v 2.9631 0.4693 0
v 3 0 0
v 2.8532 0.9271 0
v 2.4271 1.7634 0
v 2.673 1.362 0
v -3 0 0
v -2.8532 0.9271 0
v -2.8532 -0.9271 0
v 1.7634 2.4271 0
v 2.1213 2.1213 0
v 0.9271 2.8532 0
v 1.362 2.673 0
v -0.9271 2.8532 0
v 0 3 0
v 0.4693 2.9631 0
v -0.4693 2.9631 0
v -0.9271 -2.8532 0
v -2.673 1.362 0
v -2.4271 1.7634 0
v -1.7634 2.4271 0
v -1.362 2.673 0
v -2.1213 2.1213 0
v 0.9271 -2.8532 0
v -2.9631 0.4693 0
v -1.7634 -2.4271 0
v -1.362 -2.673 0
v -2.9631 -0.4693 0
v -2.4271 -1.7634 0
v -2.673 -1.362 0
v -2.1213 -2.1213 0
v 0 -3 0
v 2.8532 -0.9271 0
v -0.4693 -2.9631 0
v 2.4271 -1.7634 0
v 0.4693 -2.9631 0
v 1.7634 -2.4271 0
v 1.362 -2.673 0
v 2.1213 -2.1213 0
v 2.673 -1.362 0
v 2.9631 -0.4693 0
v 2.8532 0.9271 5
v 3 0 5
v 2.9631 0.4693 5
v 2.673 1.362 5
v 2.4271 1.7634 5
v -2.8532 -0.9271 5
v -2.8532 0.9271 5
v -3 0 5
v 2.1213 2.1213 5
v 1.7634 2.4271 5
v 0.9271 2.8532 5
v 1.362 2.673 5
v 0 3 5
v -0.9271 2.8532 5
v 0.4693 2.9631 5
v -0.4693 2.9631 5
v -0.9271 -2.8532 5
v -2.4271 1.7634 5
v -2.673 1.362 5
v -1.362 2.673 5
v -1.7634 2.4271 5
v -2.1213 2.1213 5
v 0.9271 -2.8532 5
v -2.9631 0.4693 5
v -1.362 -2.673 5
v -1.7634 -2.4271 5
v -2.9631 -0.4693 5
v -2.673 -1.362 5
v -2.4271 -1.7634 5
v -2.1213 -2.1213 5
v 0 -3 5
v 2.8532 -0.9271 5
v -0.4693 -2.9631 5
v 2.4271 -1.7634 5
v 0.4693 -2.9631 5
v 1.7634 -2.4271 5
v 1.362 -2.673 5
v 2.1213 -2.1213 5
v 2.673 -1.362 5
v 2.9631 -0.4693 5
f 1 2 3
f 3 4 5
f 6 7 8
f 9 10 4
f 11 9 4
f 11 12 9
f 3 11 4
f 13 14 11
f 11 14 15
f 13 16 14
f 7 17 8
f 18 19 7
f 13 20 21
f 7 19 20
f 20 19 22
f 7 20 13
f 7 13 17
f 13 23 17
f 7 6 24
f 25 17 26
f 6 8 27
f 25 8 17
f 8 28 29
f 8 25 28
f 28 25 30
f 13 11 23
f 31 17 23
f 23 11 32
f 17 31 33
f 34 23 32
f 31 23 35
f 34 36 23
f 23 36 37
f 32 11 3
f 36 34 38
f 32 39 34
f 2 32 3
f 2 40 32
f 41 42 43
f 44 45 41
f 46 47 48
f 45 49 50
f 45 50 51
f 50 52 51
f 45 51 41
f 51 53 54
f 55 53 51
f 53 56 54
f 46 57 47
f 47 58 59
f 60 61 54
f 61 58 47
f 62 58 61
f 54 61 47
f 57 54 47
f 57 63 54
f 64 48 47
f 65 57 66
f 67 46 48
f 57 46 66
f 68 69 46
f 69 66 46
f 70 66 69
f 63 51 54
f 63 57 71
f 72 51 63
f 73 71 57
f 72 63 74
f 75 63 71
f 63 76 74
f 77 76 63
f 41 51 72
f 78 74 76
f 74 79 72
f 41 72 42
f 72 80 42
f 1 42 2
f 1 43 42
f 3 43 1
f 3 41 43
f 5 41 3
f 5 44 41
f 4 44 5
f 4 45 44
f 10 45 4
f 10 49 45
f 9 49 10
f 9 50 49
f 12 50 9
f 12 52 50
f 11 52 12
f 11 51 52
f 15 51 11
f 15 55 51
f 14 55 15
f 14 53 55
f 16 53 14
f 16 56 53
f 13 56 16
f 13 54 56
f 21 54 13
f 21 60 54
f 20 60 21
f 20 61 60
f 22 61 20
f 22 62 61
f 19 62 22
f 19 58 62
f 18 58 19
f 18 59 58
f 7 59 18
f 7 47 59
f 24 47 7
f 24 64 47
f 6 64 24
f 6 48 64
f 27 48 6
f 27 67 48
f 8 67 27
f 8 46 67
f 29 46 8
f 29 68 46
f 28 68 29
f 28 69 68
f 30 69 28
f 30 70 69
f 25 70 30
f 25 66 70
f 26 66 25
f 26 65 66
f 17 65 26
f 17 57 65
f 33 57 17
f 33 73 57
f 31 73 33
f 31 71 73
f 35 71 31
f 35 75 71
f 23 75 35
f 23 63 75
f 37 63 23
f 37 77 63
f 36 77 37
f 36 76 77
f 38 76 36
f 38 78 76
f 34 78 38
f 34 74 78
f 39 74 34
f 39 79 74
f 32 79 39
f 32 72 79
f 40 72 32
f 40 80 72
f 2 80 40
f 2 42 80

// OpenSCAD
radius = 3;
height = 5;
detail = 40;
$fn = detail;

linear_extrude(height = height)
    circle(r = radius);
